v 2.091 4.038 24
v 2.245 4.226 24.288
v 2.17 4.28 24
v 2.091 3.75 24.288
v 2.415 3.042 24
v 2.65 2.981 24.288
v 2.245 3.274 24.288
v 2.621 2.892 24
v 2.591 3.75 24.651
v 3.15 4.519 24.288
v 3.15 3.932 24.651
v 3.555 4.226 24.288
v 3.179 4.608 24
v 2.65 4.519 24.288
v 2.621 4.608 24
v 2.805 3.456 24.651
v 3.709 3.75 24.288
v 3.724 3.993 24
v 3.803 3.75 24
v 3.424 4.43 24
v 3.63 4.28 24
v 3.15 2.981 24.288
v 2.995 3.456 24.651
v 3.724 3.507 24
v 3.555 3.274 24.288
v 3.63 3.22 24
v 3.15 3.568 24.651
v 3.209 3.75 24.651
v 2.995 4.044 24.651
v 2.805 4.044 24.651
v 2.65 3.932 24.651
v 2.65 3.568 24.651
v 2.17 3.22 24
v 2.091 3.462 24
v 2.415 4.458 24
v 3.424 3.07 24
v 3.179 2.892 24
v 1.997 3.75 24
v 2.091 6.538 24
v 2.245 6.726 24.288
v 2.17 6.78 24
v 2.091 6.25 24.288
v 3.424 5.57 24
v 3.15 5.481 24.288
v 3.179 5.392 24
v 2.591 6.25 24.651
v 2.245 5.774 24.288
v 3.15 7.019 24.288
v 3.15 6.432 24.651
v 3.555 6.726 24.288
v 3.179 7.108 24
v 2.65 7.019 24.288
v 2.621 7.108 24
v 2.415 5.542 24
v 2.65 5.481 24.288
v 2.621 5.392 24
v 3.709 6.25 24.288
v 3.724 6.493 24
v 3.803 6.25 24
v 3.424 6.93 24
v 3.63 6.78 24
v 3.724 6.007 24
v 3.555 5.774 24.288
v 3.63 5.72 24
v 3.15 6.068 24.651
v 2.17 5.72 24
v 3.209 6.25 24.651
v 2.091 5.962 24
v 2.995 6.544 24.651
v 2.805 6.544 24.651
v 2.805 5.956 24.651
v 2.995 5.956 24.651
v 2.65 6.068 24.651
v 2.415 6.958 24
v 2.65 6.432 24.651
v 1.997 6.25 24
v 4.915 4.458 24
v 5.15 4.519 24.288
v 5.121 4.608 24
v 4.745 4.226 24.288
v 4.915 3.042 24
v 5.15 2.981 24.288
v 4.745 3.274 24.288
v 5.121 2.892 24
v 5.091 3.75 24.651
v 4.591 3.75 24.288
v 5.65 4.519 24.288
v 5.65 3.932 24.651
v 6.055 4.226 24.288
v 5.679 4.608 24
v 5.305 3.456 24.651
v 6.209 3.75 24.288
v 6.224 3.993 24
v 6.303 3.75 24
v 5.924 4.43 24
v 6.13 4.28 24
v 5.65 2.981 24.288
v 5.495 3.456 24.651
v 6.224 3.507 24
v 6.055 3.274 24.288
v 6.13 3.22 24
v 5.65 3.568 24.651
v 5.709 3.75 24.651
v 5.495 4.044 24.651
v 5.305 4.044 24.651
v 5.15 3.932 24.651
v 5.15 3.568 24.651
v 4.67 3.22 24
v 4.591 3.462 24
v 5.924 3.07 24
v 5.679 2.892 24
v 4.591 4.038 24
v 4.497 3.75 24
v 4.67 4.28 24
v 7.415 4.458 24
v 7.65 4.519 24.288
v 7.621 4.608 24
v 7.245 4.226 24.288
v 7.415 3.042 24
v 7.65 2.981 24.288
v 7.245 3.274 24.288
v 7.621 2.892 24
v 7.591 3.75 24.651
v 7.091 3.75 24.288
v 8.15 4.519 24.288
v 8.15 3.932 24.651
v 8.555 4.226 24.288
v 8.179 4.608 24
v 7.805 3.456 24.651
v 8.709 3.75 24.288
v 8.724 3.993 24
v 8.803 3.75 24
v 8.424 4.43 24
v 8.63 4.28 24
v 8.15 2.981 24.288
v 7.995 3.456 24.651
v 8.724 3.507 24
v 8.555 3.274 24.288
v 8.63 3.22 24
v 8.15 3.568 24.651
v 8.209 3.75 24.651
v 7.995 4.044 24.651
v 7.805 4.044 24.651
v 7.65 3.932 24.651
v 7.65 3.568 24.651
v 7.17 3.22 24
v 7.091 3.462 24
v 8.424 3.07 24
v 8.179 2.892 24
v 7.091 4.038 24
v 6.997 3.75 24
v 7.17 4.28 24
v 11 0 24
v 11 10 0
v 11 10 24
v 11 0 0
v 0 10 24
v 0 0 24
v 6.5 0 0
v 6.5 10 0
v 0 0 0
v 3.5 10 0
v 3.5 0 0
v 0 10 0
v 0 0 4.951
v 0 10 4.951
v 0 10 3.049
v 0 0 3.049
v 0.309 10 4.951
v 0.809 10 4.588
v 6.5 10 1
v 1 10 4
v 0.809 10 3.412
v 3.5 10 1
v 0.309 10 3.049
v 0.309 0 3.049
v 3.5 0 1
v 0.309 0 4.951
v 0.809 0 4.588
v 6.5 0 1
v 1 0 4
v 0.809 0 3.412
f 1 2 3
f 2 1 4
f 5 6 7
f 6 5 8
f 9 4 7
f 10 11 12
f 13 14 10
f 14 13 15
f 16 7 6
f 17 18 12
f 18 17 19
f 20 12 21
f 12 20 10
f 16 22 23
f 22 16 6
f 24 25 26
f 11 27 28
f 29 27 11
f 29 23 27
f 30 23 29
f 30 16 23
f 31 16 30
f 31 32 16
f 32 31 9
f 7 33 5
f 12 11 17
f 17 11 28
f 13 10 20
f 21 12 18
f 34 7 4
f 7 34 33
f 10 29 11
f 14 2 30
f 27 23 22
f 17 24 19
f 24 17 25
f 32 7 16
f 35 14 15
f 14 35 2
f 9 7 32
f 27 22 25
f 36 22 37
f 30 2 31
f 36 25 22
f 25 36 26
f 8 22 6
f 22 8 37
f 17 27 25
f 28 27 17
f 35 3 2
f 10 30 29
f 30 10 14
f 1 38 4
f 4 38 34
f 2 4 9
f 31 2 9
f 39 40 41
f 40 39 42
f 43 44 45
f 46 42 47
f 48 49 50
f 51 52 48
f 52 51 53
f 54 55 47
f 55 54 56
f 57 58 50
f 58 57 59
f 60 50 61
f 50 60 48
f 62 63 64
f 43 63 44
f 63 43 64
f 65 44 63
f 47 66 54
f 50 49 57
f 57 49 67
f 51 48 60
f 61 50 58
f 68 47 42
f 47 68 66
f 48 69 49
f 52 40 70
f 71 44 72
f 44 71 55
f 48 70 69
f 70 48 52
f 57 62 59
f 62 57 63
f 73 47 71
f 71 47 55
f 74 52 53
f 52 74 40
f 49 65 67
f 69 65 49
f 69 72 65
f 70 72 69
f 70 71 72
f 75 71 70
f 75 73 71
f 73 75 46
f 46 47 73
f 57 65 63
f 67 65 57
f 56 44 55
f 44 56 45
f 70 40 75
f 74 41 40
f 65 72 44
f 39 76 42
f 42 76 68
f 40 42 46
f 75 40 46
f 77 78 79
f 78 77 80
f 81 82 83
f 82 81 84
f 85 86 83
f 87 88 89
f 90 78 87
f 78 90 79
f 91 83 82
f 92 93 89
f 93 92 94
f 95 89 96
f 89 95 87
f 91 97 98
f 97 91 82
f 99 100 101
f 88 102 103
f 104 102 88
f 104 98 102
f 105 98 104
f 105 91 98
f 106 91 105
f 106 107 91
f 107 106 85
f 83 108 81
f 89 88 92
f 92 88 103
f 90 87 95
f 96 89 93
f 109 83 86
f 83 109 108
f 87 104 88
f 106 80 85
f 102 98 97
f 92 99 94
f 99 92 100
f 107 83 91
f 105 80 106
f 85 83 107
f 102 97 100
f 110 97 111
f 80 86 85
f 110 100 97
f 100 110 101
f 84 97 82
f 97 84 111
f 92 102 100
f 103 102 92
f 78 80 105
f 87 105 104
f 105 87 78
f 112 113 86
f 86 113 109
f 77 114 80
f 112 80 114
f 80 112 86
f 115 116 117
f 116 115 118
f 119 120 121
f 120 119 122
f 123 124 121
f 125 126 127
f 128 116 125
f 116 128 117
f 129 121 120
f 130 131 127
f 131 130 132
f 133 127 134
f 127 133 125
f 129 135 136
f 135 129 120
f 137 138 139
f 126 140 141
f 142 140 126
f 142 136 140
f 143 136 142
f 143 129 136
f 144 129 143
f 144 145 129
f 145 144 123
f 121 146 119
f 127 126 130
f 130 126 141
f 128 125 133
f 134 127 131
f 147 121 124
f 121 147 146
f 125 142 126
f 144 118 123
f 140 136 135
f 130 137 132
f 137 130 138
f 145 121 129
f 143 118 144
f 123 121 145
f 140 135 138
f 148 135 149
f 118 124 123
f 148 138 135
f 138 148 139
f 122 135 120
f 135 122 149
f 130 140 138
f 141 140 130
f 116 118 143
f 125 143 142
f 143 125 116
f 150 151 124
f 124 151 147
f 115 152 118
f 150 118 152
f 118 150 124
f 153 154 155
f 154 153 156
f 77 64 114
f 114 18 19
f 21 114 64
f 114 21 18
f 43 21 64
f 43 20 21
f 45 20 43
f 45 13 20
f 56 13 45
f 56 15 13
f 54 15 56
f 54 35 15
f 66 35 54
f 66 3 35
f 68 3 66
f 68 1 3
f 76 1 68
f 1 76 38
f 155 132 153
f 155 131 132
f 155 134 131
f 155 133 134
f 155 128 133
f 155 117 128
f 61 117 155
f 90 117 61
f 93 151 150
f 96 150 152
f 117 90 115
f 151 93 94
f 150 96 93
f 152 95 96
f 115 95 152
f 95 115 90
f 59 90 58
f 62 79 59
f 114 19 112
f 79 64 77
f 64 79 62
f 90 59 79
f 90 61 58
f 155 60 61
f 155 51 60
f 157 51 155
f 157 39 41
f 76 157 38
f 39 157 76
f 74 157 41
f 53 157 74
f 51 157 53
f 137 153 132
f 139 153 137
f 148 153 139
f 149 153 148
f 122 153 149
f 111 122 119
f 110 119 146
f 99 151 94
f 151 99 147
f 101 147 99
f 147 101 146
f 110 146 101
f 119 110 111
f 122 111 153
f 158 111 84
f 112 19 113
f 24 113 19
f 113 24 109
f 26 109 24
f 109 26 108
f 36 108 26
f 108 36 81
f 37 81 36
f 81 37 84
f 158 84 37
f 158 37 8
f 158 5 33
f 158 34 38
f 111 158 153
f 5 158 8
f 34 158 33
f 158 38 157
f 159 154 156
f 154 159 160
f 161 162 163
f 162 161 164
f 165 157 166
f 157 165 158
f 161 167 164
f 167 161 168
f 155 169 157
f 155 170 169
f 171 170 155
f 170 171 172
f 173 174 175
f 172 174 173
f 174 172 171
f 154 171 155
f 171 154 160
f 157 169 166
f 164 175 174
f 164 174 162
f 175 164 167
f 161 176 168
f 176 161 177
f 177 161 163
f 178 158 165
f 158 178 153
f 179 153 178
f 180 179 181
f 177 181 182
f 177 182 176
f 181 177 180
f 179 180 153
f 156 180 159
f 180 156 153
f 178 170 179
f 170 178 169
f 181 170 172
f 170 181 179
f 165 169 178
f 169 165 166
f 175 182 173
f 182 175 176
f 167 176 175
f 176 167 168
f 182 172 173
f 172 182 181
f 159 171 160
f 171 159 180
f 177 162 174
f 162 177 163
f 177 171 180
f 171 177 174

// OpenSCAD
/*
Braille Module
http://creativecommons.org/licenses/by/3.0/
*/

typo_width = 10;
typo_length = 11;
typo_height = 24;

// mm sizes from http://dots.physics.orst.edu/gs_layout.html
radius = 0.25;
spacing = 2.5;
distance = 0;

plate_height = 5;
/* hauteur du point braille */
plate_thickness = 1.2;

$fn = 10;



module letter(bitmap) {
	row_size = 2;
	col_size = 3;
	bitmap_size = row_size * col_size;
	
	function loc_x(loc) = floor(loc / row_size) * spacing + spacing;
	function loc_y(loc) = loc % row_size * spacing  + (distance-spacing)/2;

	for (loc = [0:bitmap_size - 1]) {
		if (bitmap[loc] != 0) {
			union() {
				translate(v = [loc_x(loc), loc_y(loc), 0]) {
					sphere(radius = radius* bitmap[loc], center = true);
				}
			}
		}
	}
}


module braille_char(char) {
	if (char == "A") {
		letter([
			1,0,
			0,0,
			0,0
		]);
	} else if (char == "B") {
		letter([
			1,0,
			1,0,
			0,0
		]);
	} else if (char == "C") {
		letter([
			1,1,
			0,0,
			0,0
		]);
	} else if (char == "D") {
		letter([
			1,1,
			0,1,
			0,0
		]);
	} else if (char == "E") {
		letter([
			1,0,
			0,1,
			0,0
		]);
	} else if (char == "F") {
		letter([
			1,1,
			1,0,
			0,0
		]);
	} else if (char == "G") {
		letter([
			1,1,
			1,1,
			0,0
		]);
	} else if (char == "H") {
		letter([
			1,0,
			1,1,
			0,0
		]);
	} else if (char == "I") {
		letter([
			0,1,
			1,0,
			0,0
		]);
	} else if (char == "J") {
		letter([
			0,1,
			1,1,
			0,0
		]);
	} else if (char == "K") {
		letter([
			1,0,
			0,0,
			1,0
		]);
	} else if (char == "L") {
		letter([
			1,0,
			1,0,
			1,0
		]);
	} else if (char == "M") {
		letter([
			1,1,
			0,0,
			1,0
		]);
	} else if (char == "N") {
		letter([
			1,1,
			0,1,
			1,0
		]);
	} else if (char == "O") {
		letter([
			1,0,
			0,1,
			1,0
		]);
	} else if (char == "P") {
		letter([
			1,1,
			1,0,
			1,0
		]);
	} else if (char == "Q") {
		letter([
			1,1,
			1,1,
			1,0
		]);
	} else if (char == "R") {
		letter([
			1,0,
			1,1,
			1,0
		]);
	} else if (char == "S") {
		letter([
			0,1,
			1,0,
			1,0
		]);
	} else if (char == "T") {
		letter([
			0,1,
			1,1,
			1,0
		]);
	} else if (char == "U") {
		letter([
			1,0,
			0,0,
			1,1
		]);
	} else if (char == "V") {
		letter([
			1,0,
			1,1,
			1,0
		]);
	} else if (char == "W") {
		letter([
			0,1,
			1,1,
			0,1
		]);
	} else if (char == "X") {
		letter([
			1,1,
			0,0,
			1,1
		]);
	} else if (char == "Y") {
		letter([
			1,1,
			0,1,
			1,1
		]);
	} else if (char == "Z") {
		letter([
			1,0,
			0,1,
			1,1
		]);
	} else {
		echo("Invalid Character: ", char);
	}

}

module braille_str(chars, char_count) {
	echo(str("Total Width: ", distance * char_count, "mm"));
	union() {
		for (count = [0:char_count-1]) {
			translate(v = [0, count * distance, plate_thickness]) {
				braille_char(chars[count]);
			}
		}
		translate(v = [0, -distance/2, 0]) {
			color([0,0,1]) {
				cube(size = [plate_height, distance * (char_count+1), plate_thickness]);
			}
		}
	}
}

chars = ["P"];
char_count = 1;

translate([0.4,5,typo_height-1.5])
rotate([0,-90,0])
union()
{
	rotate([0,90,0]) braille_str(chars, char_count);
	// uncomment next line to have a small "foot" added for better adhesion to the print platform or raft
	//translate([-19,20,-plate_height]) cube(size = [20,5,2]);
}

	difference()
	{
		difference()
		{
		cube([typo_length,typo_width,typo_height]);

		translate([0,typo_width,4])
		rotate([90,0,0])
		color("green")
		cylinder(h=typo_width+1,r1=1, r2=1);
		}

		translate([3.5,0,1])
		rotate([0,90,0])
		cube([1.1,typo_width,3]);
	}
